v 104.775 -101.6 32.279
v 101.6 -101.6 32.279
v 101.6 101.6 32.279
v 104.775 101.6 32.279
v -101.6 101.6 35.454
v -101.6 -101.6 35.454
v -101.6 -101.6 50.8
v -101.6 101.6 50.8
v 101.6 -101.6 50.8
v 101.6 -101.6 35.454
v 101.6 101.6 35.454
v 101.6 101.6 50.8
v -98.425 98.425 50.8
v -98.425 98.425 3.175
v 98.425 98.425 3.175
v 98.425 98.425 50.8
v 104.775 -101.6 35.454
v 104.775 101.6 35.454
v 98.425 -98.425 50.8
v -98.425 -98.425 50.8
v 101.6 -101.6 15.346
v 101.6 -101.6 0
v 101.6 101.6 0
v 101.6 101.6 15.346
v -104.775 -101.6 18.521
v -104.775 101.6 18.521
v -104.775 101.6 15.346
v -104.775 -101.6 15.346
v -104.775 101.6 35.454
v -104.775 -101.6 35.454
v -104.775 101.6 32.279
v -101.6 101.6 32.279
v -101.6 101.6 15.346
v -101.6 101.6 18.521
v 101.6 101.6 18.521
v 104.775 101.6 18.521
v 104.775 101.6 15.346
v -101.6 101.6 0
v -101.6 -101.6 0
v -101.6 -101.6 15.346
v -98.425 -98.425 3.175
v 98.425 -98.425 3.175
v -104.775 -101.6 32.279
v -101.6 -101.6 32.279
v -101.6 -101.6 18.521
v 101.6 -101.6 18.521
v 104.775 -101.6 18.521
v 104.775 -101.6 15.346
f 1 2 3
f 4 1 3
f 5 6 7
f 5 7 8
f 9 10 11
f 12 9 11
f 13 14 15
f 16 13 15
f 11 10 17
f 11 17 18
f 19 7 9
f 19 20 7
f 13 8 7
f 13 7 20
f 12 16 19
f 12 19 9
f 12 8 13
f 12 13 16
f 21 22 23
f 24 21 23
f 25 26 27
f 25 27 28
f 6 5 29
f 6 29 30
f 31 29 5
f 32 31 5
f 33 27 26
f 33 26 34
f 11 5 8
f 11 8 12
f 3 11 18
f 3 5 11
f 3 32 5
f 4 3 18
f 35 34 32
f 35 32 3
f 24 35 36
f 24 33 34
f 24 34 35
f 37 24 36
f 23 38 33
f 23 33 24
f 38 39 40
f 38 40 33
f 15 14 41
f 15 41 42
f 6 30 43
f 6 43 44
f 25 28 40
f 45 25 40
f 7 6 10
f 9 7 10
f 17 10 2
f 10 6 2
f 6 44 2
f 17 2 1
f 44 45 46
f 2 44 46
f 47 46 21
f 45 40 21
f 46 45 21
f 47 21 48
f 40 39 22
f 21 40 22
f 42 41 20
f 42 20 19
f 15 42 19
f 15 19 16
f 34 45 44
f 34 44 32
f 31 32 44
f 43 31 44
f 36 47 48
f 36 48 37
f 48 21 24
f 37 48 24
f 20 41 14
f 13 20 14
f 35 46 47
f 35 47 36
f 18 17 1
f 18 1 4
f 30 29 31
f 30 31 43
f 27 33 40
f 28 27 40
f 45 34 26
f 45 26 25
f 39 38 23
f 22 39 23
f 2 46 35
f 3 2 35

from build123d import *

# Parameters (mm, degrees)
F0_W     = 203.2
F0_H     = 203.2
F0_W_2   = 196.85
F0_H_2   = 196.85
F1_DEPTH = 50.8
F2_DEPTH = 3.175
F3_W     = 203.2
F3_H     = 1.5875
F5_DEPTH = 3.175
F4_W     = 203.2
F4_H     = 1.5875
F6_DEPTH = 3.175


with BuildPart() as f1:
    # F0 (on Top) → F1 (new body)
    with BuildSketch(Plane.XY):
        Rectangle(F0_W, F0_H)
        Rectangle(F0_W_2, F0_H_2, mode=Mode.SUBTRACT)
    extrude(amount=F1_DEPTH)

    # F0 (on Top) → F2 (join)
    with BuildSketch(Plane.XY):
        Rectangle(F0_W_2, F0_H_2)
    extrude(amount=F2_DEPTH)

    # F3 (on face) → F5 (join)
    with BuildSketch(Plane(origin=(-101.6, 0, 0), x_dir=(0, -1, 0), z_dir=(-1, 0, 0))):
        with Locations((0, 34.660417)):
            Rectangle(F3_W, F3_H)
        with Locations((0, 33.072917)):
            Rectangle(F3_W, F3_H)
        with Locations((0, 17.727083)):
            Rectangle(F3_W, F3_H)
        with Locations((0, 16.139583)):
            Rectangle(F3_W, F3_H)
    extrude(amount=F5_DEPTH)

    # F4 (on face) → F6 (join)
    with BuildSketch(Plane.YZ.offset(101.6)):
        with Locations((0, 34.660417)):
            Rectangle(F4_W, F4_H)
        with Locations((0, 33.072917)):
            Rectangle(F4_W, F4_H)
        with Locations((0, 17.727083)):
            Rectangle(F4_W, F4_H)
        with Locations((0, 16.139583)):
            Rectangle(F4_W, F4_H)
    extrude(amount=F6_DEPTH)


solid = f1.part
